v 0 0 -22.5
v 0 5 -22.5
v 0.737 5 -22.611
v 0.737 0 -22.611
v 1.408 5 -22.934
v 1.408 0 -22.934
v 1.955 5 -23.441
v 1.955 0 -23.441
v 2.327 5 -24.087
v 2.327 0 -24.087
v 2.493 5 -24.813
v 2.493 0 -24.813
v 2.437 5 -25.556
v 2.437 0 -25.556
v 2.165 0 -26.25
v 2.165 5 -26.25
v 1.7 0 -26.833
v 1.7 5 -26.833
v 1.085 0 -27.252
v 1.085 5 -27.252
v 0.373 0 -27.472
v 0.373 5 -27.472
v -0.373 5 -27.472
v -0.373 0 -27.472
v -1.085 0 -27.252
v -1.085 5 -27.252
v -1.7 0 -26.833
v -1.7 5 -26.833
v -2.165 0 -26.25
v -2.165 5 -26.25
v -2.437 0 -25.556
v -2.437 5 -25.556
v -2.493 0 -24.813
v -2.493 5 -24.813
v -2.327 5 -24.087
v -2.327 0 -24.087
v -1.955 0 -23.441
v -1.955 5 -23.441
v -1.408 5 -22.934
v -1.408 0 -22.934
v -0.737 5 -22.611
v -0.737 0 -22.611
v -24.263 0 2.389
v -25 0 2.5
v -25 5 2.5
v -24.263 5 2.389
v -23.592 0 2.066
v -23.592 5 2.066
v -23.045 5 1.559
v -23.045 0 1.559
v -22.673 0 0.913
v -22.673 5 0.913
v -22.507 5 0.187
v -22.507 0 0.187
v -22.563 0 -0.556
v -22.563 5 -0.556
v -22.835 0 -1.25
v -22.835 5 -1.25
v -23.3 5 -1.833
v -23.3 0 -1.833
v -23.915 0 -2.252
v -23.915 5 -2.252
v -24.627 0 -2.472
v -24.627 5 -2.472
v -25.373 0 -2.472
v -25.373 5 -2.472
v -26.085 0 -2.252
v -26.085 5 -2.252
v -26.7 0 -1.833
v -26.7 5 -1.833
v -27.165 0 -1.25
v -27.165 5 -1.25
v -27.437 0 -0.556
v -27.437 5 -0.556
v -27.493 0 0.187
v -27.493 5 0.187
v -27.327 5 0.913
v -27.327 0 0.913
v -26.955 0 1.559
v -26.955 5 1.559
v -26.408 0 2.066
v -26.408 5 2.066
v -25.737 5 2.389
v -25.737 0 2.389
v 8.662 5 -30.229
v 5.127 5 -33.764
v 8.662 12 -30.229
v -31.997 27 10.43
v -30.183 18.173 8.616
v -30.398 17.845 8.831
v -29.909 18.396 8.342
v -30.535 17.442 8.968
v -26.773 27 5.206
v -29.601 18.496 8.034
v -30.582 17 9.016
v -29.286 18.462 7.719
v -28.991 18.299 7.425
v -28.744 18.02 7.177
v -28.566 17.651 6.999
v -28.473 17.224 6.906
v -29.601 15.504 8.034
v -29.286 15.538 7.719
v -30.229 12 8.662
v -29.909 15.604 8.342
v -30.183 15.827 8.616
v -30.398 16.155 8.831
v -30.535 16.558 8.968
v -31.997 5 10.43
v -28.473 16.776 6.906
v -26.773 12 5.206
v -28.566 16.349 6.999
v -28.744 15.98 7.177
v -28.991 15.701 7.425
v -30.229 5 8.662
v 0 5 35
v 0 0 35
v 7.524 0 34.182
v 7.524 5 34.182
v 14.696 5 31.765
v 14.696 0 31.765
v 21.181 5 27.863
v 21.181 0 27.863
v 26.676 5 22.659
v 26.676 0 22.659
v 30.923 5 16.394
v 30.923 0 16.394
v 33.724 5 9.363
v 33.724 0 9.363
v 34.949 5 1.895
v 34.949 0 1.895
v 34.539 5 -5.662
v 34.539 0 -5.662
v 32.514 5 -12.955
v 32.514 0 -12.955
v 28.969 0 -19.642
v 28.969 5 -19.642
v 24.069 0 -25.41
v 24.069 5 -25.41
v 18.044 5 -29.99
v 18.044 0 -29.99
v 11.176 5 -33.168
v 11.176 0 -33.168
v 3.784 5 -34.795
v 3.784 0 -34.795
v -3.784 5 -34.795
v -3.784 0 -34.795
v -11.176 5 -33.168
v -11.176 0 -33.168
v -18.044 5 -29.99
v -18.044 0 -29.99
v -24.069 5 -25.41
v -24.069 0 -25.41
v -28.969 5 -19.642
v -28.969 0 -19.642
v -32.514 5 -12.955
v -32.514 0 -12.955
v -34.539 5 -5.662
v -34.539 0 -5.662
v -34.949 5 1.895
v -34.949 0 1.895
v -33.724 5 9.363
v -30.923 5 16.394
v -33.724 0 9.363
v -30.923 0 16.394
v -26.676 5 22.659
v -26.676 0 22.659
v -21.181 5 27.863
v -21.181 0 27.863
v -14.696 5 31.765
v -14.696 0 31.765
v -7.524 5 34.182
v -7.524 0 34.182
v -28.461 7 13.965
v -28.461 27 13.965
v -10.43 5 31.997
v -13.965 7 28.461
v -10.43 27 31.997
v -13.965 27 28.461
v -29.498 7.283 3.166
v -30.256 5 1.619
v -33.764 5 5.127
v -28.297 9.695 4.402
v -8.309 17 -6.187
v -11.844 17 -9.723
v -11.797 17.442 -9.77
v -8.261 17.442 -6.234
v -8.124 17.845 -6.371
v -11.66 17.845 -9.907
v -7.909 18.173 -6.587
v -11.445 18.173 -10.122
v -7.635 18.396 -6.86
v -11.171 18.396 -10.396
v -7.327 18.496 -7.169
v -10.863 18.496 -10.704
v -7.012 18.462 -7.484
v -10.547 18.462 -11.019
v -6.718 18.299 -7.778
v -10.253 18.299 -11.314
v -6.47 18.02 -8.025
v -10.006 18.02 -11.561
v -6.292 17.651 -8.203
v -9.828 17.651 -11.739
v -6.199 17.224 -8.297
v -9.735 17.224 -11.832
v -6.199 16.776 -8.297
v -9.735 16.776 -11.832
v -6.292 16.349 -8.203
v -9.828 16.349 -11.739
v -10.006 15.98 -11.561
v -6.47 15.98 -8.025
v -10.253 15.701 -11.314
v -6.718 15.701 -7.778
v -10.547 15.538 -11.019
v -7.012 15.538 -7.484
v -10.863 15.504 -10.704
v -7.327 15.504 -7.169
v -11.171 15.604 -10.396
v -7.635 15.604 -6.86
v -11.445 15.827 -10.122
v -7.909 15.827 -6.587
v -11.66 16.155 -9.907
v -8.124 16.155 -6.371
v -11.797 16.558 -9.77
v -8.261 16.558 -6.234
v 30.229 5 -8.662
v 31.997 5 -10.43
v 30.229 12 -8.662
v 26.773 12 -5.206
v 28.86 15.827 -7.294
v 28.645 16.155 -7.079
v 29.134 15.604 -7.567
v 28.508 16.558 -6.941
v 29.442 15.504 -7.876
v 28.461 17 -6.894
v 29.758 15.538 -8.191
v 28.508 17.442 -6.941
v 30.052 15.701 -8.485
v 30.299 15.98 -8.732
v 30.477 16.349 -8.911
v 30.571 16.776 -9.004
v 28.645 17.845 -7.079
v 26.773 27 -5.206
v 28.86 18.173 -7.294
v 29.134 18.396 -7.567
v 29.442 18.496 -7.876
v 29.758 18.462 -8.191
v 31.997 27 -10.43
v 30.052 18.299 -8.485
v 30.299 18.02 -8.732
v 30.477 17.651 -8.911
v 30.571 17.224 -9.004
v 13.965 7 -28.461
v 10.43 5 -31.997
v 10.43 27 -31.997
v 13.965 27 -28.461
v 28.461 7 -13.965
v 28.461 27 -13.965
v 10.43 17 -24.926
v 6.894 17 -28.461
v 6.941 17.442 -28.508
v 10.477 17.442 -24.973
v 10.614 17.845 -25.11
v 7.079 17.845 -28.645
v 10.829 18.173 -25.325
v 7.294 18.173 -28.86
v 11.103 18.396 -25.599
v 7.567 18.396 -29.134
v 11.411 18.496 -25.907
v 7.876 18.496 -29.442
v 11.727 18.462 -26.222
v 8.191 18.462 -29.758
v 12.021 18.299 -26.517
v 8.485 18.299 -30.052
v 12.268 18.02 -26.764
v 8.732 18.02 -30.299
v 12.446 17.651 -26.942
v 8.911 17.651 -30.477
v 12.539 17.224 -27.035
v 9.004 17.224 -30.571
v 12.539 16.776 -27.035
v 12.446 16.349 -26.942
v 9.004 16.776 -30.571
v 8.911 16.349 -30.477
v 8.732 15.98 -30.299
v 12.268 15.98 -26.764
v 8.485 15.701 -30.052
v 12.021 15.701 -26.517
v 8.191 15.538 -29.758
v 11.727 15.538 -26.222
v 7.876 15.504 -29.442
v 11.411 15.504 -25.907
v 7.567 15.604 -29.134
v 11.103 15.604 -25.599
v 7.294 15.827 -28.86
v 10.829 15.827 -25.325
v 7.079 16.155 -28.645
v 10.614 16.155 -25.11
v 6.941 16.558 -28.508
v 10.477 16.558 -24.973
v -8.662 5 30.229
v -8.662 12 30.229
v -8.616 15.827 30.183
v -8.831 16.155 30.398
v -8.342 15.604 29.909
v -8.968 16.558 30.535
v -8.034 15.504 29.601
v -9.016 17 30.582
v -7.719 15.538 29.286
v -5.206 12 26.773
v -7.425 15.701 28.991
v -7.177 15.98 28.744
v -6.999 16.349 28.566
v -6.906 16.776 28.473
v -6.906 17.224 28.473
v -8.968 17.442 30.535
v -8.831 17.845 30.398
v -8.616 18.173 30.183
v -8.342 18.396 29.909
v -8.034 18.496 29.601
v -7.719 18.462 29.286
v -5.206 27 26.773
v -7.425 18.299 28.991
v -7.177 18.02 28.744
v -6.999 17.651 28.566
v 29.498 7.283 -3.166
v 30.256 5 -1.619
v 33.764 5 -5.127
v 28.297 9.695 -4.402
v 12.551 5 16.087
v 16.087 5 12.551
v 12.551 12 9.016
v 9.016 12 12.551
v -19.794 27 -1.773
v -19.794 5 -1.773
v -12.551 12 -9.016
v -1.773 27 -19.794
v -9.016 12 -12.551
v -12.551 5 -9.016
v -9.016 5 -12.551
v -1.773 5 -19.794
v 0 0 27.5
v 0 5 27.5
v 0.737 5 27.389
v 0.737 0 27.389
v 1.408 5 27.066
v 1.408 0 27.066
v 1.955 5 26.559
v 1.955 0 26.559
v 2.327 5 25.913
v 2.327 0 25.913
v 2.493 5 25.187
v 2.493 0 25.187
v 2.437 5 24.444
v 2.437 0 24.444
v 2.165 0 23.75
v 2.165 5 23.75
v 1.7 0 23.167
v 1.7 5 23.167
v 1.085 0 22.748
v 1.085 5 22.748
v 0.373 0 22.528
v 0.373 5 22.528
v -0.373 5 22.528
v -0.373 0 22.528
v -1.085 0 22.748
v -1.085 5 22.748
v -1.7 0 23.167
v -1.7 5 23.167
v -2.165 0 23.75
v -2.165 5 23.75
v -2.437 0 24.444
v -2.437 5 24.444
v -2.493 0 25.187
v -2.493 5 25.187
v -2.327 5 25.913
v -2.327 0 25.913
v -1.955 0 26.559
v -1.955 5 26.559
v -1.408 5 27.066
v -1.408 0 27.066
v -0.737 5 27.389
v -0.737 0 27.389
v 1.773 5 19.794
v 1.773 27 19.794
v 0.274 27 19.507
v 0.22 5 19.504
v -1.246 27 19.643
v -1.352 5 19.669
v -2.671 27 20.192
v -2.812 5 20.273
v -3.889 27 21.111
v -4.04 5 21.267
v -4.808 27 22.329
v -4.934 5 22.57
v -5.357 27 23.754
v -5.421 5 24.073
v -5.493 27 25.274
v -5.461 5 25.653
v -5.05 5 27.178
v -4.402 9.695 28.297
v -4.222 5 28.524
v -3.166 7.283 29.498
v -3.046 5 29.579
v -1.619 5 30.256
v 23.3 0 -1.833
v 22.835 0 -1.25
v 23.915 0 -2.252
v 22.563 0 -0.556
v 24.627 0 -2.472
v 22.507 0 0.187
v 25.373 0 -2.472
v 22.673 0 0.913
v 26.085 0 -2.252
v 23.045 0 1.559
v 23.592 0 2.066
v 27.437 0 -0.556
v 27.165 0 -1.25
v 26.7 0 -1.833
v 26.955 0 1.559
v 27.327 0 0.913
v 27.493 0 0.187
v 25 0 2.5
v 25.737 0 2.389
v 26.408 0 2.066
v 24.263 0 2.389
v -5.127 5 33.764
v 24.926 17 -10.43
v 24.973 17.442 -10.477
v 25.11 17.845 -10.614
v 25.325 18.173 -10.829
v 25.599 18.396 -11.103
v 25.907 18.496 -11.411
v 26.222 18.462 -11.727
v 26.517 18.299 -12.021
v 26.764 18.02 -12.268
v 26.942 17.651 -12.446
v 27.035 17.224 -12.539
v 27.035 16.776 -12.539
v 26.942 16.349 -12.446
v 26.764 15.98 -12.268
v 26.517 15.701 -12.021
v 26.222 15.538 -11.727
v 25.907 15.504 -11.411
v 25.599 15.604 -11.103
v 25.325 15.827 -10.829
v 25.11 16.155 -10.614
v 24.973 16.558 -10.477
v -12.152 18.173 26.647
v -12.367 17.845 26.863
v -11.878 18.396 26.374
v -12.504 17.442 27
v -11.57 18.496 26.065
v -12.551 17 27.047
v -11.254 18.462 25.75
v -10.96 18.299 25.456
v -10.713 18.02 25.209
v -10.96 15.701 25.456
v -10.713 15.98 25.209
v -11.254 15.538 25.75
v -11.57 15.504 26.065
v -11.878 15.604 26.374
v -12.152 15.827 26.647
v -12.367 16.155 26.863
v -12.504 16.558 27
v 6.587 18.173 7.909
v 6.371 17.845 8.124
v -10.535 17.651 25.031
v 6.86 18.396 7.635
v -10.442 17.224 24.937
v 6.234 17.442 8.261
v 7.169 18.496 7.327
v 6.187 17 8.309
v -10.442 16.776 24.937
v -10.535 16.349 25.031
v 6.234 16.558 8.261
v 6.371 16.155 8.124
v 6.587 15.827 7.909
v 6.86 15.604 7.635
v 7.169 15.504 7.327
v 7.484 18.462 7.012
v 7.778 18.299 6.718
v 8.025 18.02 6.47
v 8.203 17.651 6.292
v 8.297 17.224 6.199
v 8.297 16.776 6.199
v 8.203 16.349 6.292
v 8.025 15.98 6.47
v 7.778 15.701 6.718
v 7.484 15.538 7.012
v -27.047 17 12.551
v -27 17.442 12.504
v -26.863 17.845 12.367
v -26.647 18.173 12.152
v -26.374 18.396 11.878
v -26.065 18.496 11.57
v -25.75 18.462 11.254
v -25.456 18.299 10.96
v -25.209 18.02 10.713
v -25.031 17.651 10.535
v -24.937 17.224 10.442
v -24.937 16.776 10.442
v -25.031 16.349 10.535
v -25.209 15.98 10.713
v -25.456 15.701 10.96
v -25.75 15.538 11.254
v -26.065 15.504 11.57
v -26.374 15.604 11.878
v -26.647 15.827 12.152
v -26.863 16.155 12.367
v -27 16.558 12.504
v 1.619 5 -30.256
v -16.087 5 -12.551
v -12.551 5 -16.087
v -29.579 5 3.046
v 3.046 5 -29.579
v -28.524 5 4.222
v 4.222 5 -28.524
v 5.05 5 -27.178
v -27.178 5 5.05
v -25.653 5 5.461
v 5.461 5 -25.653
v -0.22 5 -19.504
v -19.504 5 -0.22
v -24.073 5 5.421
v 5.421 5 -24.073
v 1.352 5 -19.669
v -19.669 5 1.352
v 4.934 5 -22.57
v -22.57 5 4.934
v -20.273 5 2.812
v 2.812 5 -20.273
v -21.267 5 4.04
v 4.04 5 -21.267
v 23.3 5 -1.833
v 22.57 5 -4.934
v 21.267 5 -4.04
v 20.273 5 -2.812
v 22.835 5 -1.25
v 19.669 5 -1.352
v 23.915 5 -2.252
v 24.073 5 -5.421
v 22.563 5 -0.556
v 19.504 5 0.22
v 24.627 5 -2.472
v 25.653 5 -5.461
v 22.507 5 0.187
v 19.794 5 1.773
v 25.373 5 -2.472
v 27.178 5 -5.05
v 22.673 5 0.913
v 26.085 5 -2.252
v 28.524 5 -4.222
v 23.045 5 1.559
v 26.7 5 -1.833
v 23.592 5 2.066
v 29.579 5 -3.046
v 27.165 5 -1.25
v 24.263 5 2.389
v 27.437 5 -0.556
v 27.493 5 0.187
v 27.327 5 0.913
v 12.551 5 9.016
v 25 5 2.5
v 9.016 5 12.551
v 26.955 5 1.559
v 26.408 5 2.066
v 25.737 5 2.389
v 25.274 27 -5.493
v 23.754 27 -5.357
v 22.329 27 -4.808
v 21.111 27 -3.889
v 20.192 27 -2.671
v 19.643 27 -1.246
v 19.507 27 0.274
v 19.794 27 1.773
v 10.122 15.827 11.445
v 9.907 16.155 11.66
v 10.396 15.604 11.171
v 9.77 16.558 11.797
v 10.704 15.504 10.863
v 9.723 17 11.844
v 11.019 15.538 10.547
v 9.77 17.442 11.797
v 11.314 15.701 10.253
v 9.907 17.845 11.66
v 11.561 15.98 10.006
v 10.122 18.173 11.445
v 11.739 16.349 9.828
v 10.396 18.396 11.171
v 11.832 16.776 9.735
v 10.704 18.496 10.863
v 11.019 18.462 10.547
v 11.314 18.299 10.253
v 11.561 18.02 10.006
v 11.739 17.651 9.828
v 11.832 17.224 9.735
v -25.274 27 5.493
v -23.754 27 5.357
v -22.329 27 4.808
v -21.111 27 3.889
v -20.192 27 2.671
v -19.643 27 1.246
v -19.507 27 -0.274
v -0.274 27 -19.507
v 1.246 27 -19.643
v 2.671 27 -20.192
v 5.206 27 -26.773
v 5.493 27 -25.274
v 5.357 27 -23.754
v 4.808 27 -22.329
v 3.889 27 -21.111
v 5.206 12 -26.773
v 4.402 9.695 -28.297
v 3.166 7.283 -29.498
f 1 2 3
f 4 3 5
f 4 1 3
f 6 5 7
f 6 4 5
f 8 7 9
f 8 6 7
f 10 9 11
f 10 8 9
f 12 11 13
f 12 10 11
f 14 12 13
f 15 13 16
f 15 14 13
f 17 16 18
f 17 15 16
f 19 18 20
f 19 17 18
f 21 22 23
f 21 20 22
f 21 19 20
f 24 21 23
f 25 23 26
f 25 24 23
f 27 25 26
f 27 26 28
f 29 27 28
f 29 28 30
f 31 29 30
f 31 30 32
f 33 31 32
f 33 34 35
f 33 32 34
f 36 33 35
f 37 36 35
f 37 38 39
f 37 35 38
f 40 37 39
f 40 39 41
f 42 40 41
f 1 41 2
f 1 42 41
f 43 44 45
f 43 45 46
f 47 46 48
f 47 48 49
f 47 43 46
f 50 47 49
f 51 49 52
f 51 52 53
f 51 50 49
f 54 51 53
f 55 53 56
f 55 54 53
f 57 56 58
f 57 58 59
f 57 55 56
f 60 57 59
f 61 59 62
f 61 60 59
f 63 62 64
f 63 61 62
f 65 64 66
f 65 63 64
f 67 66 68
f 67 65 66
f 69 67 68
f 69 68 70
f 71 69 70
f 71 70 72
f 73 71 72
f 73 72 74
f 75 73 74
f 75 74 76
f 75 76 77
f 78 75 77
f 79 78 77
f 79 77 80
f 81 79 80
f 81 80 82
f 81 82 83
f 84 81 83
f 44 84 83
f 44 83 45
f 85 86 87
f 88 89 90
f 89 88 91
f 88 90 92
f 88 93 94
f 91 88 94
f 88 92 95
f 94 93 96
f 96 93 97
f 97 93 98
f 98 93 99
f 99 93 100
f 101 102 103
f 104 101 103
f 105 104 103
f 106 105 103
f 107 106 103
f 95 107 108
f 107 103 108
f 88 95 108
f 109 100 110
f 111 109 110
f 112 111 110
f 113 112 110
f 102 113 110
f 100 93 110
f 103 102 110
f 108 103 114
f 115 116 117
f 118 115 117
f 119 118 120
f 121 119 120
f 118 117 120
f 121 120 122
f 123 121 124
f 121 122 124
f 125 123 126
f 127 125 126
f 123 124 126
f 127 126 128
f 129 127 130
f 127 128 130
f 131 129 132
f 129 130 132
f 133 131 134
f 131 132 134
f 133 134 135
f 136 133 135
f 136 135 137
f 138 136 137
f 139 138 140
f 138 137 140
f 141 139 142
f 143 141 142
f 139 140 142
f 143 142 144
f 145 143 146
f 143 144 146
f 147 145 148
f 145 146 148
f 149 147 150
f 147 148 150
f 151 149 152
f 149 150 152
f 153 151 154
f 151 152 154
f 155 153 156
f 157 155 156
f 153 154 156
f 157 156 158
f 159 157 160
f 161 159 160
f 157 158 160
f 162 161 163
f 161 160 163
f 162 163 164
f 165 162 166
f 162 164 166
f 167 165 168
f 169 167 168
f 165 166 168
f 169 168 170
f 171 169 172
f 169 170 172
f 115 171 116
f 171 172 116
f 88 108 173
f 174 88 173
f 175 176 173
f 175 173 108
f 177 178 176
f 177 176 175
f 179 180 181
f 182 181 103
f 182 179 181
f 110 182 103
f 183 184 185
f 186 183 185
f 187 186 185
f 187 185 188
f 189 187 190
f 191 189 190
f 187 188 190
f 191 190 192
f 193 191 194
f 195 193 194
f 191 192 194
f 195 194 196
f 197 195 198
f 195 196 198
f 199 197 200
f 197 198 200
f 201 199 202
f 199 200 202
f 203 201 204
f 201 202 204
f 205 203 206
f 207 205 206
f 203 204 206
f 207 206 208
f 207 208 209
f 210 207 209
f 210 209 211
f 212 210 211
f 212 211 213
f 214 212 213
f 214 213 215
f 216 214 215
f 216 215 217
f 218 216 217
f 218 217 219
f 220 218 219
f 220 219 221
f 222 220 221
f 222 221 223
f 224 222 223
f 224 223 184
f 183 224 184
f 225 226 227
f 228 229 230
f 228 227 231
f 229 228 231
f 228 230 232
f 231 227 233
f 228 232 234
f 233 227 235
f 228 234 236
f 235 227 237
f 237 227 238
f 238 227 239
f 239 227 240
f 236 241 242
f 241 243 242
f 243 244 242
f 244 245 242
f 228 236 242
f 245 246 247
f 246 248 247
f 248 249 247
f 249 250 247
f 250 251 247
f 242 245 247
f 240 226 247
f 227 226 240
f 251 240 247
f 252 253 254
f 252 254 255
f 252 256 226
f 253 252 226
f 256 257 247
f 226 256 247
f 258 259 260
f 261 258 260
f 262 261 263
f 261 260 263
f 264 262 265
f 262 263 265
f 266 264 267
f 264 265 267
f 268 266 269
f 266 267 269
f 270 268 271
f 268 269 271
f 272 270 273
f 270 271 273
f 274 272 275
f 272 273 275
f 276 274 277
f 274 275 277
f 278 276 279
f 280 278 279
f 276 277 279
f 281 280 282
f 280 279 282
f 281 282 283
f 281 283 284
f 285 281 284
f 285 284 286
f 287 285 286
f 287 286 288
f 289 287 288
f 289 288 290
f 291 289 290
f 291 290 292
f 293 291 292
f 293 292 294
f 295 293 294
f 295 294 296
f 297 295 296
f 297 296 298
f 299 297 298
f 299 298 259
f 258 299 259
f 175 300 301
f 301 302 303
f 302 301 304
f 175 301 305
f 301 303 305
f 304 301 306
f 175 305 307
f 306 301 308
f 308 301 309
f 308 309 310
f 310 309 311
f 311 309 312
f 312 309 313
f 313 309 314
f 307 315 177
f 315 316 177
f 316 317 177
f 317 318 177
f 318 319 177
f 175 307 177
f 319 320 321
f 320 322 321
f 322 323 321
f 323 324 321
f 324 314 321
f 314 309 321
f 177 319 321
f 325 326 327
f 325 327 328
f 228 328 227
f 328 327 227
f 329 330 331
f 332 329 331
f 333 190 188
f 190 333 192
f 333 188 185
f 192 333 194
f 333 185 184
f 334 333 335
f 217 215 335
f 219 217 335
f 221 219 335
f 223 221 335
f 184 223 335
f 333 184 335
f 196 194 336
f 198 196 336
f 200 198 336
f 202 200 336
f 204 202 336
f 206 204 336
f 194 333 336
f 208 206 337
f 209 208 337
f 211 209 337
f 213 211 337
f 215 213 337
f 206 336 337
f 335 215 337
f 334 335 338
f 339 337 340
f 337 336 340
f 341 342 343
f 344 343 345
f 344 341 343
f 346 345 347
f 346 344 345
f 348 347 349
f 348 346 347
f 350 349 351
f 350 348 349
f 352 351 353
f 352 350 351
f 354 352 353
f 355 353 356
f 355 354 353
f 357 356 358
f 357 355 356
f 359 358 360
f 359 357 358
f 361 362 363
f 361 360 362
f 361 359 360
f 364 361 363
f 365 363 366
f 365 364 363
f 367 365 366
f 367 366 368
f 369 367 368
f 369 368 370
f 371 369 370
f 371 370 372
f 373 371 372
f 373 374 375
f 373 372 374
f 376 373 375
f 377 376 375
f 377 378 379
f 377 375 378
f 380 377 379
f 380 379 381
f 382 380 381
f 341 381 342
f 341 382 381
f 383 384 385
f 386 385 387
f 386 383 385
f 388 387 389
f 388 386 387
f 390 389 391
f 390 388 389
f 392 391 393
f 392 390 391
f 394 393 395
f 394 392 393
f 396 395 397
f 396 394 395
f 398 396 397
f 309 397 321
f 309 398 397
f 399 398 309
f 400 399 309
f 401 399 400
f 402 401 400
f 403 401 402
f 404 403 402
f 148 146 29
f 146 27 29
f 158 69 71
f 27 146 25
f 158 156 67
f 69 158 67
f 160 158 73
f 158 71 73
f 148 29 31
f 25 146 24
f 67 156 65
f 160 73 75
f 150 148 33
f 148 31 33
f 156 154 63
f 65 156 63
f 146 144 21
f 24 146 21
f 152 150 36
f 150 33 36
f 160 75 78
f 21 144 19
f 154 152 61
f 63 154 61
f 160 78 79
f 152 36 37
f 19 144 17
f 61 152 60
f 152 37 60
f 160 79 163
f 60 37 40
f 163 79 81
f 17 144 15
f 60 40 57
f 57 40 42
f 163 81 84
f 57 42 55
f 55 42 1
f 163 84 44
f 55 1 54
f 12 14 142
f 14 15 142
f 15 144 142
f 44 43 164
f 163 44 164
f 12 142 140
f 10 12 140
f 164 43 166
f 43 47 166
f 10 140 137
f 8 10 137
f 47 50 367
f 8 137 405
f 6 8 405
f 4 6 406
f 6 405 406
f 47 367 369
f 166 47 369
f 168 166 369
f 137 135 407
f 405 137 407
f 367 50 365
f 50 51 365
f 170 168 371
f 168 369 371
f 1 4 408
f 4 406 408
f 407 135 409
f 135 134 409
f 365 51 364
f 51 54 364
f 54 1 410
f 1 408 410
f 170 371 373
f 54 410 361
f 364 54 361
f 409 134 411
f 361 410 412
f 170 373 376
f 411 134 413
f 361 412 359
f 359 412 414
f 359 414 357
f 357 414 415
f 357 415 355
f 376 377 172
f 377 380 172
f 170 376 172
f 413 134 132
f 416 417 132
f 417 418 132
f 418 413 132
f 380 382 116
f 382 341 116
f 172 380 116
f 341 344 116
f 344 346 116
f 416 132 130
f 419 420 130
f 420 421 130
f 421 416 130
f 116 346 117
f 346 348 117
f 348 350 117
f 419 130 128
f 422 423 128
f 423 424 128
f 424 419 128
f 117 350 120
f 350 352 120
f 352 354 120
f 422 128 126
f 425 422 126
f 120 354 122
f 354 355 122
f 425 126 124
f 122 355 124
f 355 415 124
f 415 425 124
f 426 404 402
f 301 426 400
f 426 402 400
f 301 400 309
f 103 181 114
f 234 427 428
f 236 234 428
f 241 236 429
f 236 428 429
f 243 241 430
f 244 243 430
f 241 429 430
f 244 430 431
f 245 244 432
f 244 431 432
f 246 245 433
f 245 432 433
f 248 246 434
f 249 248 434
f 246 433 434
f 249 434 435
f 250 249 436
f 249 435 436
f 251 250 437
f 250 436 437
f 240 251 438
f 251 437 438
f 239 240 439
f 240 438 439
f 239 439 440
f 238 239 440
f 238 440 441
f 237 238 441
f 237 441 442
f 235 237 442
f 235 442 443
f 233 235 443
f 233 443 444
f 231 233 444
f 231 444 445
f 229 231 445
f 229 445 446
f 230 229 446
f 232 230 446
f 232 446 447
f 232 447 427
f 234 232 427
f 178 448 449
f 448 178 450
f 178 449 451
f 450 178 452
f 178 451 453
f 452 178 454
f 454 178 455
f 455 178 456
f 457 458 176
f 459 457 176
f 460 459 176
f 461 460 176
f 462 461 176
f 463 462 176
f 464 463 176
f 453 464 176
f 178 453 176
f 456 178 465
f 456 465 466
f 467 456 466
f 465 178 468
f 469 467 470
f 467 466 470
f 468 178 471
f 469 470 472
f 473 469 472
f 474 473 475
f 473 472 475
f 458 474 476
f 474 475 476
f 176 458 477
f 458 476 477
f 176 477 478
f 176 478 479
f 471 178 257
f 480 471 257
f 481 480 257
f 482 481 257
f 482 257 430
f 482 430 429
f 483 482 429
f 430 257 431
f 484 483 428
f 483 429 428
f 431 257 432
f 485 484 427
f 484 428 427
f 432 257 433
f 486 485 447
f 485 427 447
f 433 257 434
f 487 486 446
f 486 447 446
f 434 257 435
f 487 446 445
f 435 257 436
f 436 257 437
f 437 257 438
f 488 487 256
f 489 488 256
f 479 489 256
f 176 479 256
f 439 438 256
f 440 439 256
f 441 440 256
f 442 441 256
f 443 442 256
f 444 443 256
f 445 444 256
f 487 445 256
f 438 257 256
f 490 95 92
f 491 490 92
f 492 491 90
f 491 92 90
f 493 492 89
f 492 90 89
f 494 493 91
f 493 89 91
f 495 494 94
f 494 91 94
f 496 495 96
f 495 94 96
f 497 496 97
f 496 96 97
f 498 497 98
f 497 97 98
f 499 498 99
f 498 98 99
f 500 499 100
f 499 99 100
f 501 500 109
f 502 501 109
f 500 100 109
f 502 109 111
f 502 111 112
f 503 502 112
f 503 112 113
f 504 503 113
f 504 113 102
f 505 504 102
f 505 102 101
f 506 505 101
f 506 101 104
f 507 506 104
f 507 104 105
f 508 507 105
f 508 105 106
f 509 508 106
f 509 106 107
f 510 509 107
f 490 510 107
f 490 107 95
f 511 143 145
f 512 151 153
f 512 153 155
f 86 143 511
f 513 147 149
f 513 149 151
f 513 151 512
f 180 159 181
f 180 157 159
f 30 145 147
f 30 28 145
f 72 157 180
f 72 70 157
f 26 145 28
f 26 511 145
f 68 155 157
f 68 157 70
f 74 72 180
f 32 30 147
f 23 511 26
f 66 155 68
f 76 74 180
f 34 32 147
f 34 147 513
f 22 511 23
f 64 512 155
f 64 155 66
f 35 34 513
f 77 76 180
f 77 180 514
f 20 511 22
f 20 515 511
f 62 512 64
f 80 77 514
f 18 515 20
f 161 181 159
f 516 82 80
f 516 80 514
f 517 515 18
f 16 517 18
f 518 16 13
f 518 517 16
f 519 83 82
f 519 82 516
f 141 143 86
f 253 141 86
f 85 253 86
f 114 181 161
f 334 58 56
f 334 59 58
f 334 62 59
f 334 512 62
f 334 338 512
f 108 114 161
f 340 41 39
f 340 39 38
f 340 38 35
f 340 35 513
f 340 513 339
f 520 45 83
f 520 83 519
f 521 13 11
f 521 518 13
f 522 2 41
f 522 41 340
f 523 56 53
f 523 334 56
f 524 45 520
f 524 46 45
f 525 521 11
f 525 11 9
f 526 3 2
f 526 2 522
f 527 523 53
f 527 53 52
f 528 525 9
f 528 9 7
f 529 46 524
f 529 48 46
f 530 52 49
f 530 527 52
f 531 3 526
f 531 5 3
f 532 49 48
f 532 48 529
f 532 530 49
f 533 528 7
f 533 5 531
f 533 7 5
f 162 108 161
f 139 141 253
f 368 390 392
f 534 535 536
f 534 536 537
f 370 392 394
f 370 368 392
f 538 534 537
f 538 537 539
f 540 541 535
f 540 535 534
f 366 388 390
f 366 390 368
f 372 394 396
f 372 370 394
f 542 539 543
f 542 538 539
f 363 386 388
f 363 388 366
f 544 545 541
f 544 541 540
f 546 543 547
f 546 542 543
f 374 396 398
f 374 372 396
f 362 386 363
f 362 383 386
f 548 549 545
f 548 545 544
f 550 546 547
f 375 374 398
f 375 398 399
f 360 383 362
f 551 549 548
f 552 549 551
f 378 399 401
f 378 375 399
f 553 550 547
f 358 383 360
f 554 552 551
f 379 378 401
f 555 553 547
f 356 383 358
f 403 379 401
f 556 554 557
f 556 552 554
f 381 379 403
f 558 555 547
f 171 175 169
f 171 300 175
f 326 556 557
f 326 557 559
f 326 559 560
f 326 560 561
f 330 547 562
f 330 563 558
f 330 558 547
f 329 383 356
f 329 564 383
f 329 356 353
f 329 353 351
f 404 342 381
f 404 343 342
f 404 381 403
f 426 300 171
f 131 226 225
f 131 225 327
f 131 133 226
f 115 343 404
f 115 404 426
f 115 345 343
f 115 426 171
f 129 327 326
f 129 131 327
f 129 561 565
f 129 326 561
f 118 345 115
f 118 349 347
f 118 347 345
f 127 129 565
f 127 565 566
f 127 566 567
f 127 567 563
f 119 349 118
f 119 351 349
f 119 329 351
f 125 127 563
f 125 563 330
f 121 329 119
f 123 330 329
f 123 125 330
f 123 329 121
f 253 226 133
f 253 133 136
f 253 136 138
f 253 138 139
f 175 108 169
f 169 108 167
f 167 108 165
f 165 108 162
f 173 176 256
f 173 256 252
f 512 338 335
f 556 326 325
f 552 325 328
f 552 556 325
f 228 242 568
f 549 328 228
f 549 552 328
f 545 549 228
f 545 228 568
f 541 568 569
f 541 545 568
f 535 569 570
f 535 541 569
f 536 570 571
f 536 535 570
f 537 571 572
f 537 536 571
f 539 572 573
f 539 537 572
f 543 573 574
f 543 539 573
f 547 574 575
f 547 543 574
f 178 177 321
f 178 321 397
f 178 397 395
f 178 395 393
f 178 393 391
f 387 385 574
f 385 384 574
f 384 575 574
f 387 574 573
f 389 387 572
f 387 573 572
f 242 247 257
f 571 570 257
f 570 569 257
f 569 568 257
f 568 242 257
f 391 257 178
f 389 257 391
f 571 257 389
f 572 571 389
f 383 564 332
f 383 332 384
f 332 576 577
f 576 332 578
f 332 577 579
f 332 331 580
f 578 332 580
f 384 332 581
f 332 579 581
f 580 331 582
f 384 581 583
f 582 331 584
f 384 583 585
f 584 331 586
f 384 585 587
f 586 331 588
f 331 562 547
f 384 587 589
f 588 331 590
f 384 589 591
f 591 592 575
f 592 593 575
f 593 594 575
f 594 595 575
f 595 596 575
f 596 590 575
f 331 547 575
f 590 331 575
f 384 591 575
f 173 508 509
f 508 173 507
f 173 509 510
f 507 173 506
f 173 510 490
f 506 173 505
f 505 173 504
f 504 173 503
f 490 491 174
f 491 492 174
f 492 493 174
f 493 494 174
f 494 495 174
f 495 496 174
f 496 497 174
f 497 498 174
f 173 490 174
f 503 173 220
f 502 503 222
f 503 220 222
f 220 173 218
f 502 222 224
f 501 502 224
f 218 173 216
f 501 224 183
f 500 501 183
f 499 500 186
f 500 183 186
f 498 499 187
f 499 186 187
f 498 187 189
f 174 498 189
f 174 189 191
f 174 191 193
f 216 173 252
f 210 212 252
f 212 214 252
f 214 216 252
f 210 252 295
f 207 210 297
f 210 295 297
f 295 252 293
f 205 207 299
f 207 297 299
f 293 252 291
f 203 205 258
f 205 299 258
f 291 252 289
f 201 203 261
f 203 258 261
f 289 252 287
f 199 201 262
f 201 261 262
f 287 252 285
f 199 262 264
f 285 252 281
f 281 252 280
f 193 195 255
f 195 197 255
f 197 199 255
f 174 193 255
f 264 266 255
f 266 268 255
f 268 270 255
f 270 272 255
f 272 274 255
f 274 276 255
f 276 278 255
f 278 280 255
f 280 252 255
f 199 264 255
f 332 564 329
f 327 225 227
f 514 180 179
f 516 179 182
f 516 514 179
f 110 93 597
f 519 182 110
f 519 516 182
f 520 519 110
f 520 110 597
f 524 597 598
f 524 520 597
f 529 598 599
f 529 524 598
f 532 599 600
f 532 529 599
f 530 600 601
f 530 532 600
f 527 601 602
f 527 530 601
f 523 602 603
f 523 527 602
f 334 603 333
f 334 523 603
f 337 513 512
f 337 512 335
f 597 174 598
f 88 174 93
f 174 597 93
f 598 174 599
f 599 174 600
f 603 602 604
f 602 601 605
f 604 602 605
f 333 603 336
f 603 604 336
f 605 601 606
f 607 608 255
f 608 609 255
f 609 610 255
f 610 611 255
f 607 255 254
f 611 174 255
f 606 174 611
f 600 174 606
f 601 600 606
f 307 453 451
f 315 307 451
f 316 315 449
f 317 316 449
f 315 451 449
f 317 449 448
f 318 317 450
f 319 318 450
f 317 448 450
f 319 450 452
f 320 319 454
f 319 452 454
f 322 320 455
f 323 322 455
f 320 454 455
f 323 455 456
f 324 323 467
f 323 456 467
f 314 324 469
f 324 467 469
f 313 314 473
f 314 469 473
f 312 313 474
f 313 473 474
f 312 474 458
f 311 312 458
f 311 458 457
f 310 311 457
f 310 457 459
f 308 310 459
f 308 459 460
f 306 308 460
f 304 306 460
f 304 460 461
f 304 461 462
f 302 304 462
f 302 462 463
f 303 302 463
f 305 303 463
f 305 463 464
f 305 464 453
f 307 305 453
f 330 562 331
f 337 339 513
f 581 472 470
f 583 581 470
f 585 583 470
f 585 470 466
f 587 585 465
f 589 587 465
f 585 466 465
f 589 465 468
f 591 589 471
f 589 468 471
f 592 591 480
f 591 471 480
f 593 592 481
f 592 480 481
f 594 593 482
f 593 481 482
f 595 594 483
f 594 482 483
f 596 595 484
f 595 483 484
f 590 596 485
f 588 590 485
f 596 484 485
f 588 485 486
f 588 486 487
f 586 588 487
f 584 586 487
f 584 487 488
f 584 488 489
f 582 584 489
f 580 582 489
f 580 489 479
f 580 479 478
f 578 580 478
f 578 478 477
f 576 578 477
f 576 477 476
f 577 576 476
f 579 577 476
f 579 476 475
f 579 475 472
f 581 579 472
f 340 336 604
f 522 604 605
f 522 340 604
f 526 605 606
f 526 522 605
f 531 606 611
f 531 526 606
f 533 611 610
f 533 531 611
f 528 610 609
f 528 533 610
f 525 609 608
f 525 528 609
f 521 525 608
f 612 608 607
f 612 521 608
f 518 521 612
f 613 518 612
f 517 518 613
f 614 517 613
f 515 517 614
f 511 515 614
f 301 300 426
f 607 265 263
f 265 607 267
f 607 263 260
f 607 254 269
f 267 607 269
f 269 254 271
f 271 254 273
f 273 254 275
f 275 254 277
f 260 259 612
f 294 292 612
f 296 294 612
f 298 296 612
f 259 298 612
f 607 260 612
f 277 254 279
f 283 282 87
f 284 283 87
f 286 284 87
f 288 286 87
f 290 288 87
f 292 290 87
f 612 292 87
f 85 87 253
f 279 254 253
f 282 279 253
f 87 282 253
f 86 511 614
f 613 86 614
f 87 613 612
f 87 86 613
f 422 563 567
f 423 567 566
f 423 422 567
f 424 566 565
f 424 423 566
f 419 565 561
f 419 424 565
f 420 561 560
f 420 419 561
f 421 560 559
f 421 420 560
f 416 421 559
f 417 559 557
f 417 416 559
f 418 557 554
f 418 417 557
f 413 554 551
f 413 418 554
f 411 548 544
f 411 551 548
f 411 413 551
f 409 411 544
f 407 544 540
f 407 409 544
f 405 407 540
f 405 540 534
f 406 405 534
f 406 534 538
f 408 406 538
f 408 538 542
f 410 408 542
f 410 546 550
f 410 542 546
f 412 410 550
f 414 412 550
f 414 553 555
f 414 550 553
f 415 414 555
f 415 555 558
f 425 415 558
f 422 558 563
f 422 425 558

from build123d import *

# Parameters (mm, degrees)
SKETCH_1_R                 = 35
SKETCH_1_R_2               = 2.5
EXTRUDE_1_DEPTH            = 5
EXTRUDE_2_DEPTH            = 30
EXTRUDE_3_DEPTH            = 2.5
PATTERN_LINEAR_1_COUNT     = 2
PATTERN_LINEAR_1_PITCH     = 25
PATTERN_LINEAR_1_COL_COUNT = 2
PATTERN_LINEAR_1_COL_PITCH = 25
MIRROR_1_COPY_1_DEPTH      = 2.5
MIRROR_1_COPY_2_DEPTH      = 2.5
CUT_EXTRUDE_1_REACH        = 56.166
SKETCH_5_R                 = 5.5
SKETCH_6_R                 = 1.5
CUT_EXTRUDE_2_DEPTH        = 71.151518001


with BuildPart() as part:
    # 草圖1 → 填料-伸長1 (new body)
    with BuildSketch(Plane(origin=(0, 0, 0), x_dir=(1, 0, 0), z_dir=(0, 1, 0))):
        with Locations(Location((0, 0, 0), (0, 0, 270))):
            Circle(SKETCH_1_R)
        with Locations(Location((0, 25, 0), (0, 0, 270))):
            Circle(SKETCH_1_R_2, mode=Mode.SUBTRACT)
        with Locations(Location((25, 0, 0), (0, 0, 270))):
            Circle(SKETCH_1_R_2, mode=Mode.SUBTRACT)
        with Locations(Location((0, -25, 0), (0, 0, 270))):
            Circle(SKETCH_1_R_2, mode=Mode.SUBTRACT)
        with Locations(Location((-25, 0, 0), (0, 0, 270))):
            Circle(SKETCH_1_R_2, mode=Mode.SUBTRACT)
    extrude(amount=EXTRUDE_1_DEPTH)

    # 草圖3 → 填料-伸長2 (add, symmetric)
    with BuildSketch(Plane(origin=(0, 0, 0), x_dir=(-0.7071067811865477, 0, -0.7071067811865474), z_dir=(0.7071067811865474, 0, -0.7071067811865477))):
        Polygon((15.25, 5), (-15.25, 5), (-15.25, 27), (-10.25, 27), (-10.25, 7), (10.25, 7), (10.25, 27), (15.25, 27), align=None)
    extrude(amount=EXTRUDE_2_DEPTH, both=True)

    # 草圖4 → 填料-伸長3 (add, symmetric)
    with BuildSketch(Plane(origin=(0, 0, 0), x_dir=(-0.7071067811865477, 0, -0.7071067811865474), z_dir=(0.7071067811865474, 0, -0.7071067811865477))):
        Polygon((-15.25, 12), (-15.25, 5), (-20.25, 5), align=None)
    extrude_3 = extrude(amount=EXTRUDE_3_DEPTH, both=True)

    # 直線複製排列1: 填料-伸長3 ×2
    with Locations(*[Vector(-0.7071067811865474, 0, 0.7071067811865478) * (i * PATTERN_LINEAR_1_PITCH) for i in range(1, PATTERN_LINEAR_1_COUNT)]):
        add(extrude_3)

    # 直線複製排列1 col: 填料-伸長3 ×2
    with Locations(*[Vector(0.7071067811865474, 0, -0.7071067811865478) * (i * PATTERN_LINEAR_1_COL_PITCH) for i in range(1, PATTERN_LINEAR_1_COL_COUNT)]):
        add(extrude_3)

    # 鏡射1: 填料-伸長3 across plane
    add(extrude_3.mirror(Plane(origin=(0, 0, 0), x_dir=(-0.7071067811865474, 0, 0.7071067811865477), z_dir=(0.7071067811865477, 0, 0.7071067811865474))))

    # 鏡射1 copy 1 sketch → 鏡射1 copy 1 (add, symmetric)
    with BuildSketch(Plane(origin=(-17.67766953, 0, 17.67766953), x_dir=(0.7071067811865477, 0, 0.7071067811865474), z_dir=(0.7071067811865474, 0, -0.7071067811865477))):
        Polygon((-15.25, -12), (-15.25, -5), (-20.25, -5), align=None)
    extrude(amount=MIRROR_1_COPY_1_DEPTH, both=True)

    # 鏡射1 copy 2 sketch → 鏡射1 copy 2 (add, symmetric)
    with BuildSketch(Plane(origin=(17.67766953, 0, -17.67766953), x_dir=(0.7071067811865477, 0, 0.7071067811865474), z_dir=(0.7071067811865474, 0, -0.7071067811865477))):
        Polygon((-15.25, -12), (-15.25, -5), (-20.25, -5), align=None)
    extrude(amount=MIRROR_1_COPY_2_DEPTH, both=True)

    # 除料-伸長1: up to this face of the body (flat: up to its plane)
    cut_extrude_1_end = Plane(part.part.faces().sort_by_distance((-9.01561146, 27, -9.01561146))[0])
    # 草圖5 → 除料-伸長1 (cut, up to the picked face)
    with BuildSketch(Plane(origin=(0, 5, 0), x_dir=(1, 0, 0), z_dir=(0, 1, 0)), mode=Mode.PRIVATE) as cut_extrude_1_sk1:
        with Locations((0, 25)):
            Circle(SKETCH_5_R)
    cut_extrude_1_tool1 = split(extrude(cut_extrude_1_sk1.sketch, amount=CUT_EXTRUDE_1_REACH, mode=Mode.PRIVATE), bisect_by=cut_extrude_1_end, keep=Keep.BOTH, mode=Mode.PRIVATE)
    # 草圖5 → 除料-伸長1 (cut, up to the picked face)
    with BuildSketch(Plane(origin=(0, 5, 0), x_dir=(1, 0, 0), z_dir=(0, 1, 0)), mode=Mode.PRIVATE) as cut_extrude_1_sk2:
        with Locations((-25, 0)):
            Circle(SKETCH_5_R)
    cut_extrude_1_tool2 = split(extrude(cut_extrude_1_sk2.sketch, amount=CUT_EXTRUDE_1_REACH, mode=Mode.PRIVATE), bisect_by=cut_extrude_1_end, keep=Keep.BOTH, mode=Mode.PRIVATE)
    # 草圖5 → 除料-伸長1 (cut, up to the picked face)
    with BuildSketch(Plane(origin=(0, 5, 0), x_dir=(1, 0, 0), z_dir=(0, 1, 0)), mode=Mode.PRIVATE) as cut_extrude_1_sk3:
        with Locations((0, -25)):
            Circle(SKETCH_5_R)
    cut_extrude_1_tool3 = split(extrude(cut_extrude_1_sk3.sketch, amount=CUT_EXTRUDE_1_REACH, mode=Mode.PRIVATE), bisect_by=cut_extrude_1_end, keep=Keep.BOTH, mode=Mode.PRIVATE)
    # 草圖5 → 除料-伸長1 (cut, up to the picked face)
    with BuildSketch(Plane(origin=(0, 5, 0), x_dir=(1, 0, 0), z_dir=(0, 1, 0)), mode=Mode.PRIVATE) as cut_extrude_1_sk4:
        with Locations((25, 0)):
            Circle(SKETCH_5_R)
    cut_extrude_1_tool4 = split(extrude(cut_extrude_1_sk4.sketch, amount=CUT_EXTRUDE_1_REACH, mode=Mode.PRIVATE), bisect_by=cut_extrude_1_end, keep=Keep.BOTH, mode=Mode.PRIVATE)
    add(cut_extrude_1_tool1.solids().sort_by(Axis((0, 5, -25), (0, 1, 0)))[0], mode=Mode.SUBTRACT)
    add(cut_extrude_1_tool2.solids().sort_by(Axis((-25, 5, 0), (0, 1, 0)))[0], mode=Mode.SUBTRACT)
    add(cut_extrude_1_tool3.solids().sort_by(Axis((0, 5, 25), (0, 1, 0)))[0], mode=Mode.SUBTRACT)
    add(cut_extrude_1_tool4.solids().sort_by(Axis((25, 5, 0), (0, 1, 0)))[0], mode=Mode.SUBTRACT)

    # 草圖6 → 除料-伸長2 (cut, through all)
    with BuildSketch(Plane(origin=(-10.783378413, 0, -10.783378413), x_dir=(-0.7071067811865474, 0, 0.7071067811865477), z_dir=(-0.7071067811865477, 0, -0.7071067811865474))):
        with Locations((0, 17)):
            Circle(SKETCH_6_R)
        with Locations((-26.5, 17)):
            Circle(SKETCH_6_R)
        with Locations((26.5, 17)):
            Circle(SKETCH_6_R)
    extrude(amount=-CUT_EXTRUDE_2_DEPTH, mode=Mode.SUBTRACT)


solid = part.part
